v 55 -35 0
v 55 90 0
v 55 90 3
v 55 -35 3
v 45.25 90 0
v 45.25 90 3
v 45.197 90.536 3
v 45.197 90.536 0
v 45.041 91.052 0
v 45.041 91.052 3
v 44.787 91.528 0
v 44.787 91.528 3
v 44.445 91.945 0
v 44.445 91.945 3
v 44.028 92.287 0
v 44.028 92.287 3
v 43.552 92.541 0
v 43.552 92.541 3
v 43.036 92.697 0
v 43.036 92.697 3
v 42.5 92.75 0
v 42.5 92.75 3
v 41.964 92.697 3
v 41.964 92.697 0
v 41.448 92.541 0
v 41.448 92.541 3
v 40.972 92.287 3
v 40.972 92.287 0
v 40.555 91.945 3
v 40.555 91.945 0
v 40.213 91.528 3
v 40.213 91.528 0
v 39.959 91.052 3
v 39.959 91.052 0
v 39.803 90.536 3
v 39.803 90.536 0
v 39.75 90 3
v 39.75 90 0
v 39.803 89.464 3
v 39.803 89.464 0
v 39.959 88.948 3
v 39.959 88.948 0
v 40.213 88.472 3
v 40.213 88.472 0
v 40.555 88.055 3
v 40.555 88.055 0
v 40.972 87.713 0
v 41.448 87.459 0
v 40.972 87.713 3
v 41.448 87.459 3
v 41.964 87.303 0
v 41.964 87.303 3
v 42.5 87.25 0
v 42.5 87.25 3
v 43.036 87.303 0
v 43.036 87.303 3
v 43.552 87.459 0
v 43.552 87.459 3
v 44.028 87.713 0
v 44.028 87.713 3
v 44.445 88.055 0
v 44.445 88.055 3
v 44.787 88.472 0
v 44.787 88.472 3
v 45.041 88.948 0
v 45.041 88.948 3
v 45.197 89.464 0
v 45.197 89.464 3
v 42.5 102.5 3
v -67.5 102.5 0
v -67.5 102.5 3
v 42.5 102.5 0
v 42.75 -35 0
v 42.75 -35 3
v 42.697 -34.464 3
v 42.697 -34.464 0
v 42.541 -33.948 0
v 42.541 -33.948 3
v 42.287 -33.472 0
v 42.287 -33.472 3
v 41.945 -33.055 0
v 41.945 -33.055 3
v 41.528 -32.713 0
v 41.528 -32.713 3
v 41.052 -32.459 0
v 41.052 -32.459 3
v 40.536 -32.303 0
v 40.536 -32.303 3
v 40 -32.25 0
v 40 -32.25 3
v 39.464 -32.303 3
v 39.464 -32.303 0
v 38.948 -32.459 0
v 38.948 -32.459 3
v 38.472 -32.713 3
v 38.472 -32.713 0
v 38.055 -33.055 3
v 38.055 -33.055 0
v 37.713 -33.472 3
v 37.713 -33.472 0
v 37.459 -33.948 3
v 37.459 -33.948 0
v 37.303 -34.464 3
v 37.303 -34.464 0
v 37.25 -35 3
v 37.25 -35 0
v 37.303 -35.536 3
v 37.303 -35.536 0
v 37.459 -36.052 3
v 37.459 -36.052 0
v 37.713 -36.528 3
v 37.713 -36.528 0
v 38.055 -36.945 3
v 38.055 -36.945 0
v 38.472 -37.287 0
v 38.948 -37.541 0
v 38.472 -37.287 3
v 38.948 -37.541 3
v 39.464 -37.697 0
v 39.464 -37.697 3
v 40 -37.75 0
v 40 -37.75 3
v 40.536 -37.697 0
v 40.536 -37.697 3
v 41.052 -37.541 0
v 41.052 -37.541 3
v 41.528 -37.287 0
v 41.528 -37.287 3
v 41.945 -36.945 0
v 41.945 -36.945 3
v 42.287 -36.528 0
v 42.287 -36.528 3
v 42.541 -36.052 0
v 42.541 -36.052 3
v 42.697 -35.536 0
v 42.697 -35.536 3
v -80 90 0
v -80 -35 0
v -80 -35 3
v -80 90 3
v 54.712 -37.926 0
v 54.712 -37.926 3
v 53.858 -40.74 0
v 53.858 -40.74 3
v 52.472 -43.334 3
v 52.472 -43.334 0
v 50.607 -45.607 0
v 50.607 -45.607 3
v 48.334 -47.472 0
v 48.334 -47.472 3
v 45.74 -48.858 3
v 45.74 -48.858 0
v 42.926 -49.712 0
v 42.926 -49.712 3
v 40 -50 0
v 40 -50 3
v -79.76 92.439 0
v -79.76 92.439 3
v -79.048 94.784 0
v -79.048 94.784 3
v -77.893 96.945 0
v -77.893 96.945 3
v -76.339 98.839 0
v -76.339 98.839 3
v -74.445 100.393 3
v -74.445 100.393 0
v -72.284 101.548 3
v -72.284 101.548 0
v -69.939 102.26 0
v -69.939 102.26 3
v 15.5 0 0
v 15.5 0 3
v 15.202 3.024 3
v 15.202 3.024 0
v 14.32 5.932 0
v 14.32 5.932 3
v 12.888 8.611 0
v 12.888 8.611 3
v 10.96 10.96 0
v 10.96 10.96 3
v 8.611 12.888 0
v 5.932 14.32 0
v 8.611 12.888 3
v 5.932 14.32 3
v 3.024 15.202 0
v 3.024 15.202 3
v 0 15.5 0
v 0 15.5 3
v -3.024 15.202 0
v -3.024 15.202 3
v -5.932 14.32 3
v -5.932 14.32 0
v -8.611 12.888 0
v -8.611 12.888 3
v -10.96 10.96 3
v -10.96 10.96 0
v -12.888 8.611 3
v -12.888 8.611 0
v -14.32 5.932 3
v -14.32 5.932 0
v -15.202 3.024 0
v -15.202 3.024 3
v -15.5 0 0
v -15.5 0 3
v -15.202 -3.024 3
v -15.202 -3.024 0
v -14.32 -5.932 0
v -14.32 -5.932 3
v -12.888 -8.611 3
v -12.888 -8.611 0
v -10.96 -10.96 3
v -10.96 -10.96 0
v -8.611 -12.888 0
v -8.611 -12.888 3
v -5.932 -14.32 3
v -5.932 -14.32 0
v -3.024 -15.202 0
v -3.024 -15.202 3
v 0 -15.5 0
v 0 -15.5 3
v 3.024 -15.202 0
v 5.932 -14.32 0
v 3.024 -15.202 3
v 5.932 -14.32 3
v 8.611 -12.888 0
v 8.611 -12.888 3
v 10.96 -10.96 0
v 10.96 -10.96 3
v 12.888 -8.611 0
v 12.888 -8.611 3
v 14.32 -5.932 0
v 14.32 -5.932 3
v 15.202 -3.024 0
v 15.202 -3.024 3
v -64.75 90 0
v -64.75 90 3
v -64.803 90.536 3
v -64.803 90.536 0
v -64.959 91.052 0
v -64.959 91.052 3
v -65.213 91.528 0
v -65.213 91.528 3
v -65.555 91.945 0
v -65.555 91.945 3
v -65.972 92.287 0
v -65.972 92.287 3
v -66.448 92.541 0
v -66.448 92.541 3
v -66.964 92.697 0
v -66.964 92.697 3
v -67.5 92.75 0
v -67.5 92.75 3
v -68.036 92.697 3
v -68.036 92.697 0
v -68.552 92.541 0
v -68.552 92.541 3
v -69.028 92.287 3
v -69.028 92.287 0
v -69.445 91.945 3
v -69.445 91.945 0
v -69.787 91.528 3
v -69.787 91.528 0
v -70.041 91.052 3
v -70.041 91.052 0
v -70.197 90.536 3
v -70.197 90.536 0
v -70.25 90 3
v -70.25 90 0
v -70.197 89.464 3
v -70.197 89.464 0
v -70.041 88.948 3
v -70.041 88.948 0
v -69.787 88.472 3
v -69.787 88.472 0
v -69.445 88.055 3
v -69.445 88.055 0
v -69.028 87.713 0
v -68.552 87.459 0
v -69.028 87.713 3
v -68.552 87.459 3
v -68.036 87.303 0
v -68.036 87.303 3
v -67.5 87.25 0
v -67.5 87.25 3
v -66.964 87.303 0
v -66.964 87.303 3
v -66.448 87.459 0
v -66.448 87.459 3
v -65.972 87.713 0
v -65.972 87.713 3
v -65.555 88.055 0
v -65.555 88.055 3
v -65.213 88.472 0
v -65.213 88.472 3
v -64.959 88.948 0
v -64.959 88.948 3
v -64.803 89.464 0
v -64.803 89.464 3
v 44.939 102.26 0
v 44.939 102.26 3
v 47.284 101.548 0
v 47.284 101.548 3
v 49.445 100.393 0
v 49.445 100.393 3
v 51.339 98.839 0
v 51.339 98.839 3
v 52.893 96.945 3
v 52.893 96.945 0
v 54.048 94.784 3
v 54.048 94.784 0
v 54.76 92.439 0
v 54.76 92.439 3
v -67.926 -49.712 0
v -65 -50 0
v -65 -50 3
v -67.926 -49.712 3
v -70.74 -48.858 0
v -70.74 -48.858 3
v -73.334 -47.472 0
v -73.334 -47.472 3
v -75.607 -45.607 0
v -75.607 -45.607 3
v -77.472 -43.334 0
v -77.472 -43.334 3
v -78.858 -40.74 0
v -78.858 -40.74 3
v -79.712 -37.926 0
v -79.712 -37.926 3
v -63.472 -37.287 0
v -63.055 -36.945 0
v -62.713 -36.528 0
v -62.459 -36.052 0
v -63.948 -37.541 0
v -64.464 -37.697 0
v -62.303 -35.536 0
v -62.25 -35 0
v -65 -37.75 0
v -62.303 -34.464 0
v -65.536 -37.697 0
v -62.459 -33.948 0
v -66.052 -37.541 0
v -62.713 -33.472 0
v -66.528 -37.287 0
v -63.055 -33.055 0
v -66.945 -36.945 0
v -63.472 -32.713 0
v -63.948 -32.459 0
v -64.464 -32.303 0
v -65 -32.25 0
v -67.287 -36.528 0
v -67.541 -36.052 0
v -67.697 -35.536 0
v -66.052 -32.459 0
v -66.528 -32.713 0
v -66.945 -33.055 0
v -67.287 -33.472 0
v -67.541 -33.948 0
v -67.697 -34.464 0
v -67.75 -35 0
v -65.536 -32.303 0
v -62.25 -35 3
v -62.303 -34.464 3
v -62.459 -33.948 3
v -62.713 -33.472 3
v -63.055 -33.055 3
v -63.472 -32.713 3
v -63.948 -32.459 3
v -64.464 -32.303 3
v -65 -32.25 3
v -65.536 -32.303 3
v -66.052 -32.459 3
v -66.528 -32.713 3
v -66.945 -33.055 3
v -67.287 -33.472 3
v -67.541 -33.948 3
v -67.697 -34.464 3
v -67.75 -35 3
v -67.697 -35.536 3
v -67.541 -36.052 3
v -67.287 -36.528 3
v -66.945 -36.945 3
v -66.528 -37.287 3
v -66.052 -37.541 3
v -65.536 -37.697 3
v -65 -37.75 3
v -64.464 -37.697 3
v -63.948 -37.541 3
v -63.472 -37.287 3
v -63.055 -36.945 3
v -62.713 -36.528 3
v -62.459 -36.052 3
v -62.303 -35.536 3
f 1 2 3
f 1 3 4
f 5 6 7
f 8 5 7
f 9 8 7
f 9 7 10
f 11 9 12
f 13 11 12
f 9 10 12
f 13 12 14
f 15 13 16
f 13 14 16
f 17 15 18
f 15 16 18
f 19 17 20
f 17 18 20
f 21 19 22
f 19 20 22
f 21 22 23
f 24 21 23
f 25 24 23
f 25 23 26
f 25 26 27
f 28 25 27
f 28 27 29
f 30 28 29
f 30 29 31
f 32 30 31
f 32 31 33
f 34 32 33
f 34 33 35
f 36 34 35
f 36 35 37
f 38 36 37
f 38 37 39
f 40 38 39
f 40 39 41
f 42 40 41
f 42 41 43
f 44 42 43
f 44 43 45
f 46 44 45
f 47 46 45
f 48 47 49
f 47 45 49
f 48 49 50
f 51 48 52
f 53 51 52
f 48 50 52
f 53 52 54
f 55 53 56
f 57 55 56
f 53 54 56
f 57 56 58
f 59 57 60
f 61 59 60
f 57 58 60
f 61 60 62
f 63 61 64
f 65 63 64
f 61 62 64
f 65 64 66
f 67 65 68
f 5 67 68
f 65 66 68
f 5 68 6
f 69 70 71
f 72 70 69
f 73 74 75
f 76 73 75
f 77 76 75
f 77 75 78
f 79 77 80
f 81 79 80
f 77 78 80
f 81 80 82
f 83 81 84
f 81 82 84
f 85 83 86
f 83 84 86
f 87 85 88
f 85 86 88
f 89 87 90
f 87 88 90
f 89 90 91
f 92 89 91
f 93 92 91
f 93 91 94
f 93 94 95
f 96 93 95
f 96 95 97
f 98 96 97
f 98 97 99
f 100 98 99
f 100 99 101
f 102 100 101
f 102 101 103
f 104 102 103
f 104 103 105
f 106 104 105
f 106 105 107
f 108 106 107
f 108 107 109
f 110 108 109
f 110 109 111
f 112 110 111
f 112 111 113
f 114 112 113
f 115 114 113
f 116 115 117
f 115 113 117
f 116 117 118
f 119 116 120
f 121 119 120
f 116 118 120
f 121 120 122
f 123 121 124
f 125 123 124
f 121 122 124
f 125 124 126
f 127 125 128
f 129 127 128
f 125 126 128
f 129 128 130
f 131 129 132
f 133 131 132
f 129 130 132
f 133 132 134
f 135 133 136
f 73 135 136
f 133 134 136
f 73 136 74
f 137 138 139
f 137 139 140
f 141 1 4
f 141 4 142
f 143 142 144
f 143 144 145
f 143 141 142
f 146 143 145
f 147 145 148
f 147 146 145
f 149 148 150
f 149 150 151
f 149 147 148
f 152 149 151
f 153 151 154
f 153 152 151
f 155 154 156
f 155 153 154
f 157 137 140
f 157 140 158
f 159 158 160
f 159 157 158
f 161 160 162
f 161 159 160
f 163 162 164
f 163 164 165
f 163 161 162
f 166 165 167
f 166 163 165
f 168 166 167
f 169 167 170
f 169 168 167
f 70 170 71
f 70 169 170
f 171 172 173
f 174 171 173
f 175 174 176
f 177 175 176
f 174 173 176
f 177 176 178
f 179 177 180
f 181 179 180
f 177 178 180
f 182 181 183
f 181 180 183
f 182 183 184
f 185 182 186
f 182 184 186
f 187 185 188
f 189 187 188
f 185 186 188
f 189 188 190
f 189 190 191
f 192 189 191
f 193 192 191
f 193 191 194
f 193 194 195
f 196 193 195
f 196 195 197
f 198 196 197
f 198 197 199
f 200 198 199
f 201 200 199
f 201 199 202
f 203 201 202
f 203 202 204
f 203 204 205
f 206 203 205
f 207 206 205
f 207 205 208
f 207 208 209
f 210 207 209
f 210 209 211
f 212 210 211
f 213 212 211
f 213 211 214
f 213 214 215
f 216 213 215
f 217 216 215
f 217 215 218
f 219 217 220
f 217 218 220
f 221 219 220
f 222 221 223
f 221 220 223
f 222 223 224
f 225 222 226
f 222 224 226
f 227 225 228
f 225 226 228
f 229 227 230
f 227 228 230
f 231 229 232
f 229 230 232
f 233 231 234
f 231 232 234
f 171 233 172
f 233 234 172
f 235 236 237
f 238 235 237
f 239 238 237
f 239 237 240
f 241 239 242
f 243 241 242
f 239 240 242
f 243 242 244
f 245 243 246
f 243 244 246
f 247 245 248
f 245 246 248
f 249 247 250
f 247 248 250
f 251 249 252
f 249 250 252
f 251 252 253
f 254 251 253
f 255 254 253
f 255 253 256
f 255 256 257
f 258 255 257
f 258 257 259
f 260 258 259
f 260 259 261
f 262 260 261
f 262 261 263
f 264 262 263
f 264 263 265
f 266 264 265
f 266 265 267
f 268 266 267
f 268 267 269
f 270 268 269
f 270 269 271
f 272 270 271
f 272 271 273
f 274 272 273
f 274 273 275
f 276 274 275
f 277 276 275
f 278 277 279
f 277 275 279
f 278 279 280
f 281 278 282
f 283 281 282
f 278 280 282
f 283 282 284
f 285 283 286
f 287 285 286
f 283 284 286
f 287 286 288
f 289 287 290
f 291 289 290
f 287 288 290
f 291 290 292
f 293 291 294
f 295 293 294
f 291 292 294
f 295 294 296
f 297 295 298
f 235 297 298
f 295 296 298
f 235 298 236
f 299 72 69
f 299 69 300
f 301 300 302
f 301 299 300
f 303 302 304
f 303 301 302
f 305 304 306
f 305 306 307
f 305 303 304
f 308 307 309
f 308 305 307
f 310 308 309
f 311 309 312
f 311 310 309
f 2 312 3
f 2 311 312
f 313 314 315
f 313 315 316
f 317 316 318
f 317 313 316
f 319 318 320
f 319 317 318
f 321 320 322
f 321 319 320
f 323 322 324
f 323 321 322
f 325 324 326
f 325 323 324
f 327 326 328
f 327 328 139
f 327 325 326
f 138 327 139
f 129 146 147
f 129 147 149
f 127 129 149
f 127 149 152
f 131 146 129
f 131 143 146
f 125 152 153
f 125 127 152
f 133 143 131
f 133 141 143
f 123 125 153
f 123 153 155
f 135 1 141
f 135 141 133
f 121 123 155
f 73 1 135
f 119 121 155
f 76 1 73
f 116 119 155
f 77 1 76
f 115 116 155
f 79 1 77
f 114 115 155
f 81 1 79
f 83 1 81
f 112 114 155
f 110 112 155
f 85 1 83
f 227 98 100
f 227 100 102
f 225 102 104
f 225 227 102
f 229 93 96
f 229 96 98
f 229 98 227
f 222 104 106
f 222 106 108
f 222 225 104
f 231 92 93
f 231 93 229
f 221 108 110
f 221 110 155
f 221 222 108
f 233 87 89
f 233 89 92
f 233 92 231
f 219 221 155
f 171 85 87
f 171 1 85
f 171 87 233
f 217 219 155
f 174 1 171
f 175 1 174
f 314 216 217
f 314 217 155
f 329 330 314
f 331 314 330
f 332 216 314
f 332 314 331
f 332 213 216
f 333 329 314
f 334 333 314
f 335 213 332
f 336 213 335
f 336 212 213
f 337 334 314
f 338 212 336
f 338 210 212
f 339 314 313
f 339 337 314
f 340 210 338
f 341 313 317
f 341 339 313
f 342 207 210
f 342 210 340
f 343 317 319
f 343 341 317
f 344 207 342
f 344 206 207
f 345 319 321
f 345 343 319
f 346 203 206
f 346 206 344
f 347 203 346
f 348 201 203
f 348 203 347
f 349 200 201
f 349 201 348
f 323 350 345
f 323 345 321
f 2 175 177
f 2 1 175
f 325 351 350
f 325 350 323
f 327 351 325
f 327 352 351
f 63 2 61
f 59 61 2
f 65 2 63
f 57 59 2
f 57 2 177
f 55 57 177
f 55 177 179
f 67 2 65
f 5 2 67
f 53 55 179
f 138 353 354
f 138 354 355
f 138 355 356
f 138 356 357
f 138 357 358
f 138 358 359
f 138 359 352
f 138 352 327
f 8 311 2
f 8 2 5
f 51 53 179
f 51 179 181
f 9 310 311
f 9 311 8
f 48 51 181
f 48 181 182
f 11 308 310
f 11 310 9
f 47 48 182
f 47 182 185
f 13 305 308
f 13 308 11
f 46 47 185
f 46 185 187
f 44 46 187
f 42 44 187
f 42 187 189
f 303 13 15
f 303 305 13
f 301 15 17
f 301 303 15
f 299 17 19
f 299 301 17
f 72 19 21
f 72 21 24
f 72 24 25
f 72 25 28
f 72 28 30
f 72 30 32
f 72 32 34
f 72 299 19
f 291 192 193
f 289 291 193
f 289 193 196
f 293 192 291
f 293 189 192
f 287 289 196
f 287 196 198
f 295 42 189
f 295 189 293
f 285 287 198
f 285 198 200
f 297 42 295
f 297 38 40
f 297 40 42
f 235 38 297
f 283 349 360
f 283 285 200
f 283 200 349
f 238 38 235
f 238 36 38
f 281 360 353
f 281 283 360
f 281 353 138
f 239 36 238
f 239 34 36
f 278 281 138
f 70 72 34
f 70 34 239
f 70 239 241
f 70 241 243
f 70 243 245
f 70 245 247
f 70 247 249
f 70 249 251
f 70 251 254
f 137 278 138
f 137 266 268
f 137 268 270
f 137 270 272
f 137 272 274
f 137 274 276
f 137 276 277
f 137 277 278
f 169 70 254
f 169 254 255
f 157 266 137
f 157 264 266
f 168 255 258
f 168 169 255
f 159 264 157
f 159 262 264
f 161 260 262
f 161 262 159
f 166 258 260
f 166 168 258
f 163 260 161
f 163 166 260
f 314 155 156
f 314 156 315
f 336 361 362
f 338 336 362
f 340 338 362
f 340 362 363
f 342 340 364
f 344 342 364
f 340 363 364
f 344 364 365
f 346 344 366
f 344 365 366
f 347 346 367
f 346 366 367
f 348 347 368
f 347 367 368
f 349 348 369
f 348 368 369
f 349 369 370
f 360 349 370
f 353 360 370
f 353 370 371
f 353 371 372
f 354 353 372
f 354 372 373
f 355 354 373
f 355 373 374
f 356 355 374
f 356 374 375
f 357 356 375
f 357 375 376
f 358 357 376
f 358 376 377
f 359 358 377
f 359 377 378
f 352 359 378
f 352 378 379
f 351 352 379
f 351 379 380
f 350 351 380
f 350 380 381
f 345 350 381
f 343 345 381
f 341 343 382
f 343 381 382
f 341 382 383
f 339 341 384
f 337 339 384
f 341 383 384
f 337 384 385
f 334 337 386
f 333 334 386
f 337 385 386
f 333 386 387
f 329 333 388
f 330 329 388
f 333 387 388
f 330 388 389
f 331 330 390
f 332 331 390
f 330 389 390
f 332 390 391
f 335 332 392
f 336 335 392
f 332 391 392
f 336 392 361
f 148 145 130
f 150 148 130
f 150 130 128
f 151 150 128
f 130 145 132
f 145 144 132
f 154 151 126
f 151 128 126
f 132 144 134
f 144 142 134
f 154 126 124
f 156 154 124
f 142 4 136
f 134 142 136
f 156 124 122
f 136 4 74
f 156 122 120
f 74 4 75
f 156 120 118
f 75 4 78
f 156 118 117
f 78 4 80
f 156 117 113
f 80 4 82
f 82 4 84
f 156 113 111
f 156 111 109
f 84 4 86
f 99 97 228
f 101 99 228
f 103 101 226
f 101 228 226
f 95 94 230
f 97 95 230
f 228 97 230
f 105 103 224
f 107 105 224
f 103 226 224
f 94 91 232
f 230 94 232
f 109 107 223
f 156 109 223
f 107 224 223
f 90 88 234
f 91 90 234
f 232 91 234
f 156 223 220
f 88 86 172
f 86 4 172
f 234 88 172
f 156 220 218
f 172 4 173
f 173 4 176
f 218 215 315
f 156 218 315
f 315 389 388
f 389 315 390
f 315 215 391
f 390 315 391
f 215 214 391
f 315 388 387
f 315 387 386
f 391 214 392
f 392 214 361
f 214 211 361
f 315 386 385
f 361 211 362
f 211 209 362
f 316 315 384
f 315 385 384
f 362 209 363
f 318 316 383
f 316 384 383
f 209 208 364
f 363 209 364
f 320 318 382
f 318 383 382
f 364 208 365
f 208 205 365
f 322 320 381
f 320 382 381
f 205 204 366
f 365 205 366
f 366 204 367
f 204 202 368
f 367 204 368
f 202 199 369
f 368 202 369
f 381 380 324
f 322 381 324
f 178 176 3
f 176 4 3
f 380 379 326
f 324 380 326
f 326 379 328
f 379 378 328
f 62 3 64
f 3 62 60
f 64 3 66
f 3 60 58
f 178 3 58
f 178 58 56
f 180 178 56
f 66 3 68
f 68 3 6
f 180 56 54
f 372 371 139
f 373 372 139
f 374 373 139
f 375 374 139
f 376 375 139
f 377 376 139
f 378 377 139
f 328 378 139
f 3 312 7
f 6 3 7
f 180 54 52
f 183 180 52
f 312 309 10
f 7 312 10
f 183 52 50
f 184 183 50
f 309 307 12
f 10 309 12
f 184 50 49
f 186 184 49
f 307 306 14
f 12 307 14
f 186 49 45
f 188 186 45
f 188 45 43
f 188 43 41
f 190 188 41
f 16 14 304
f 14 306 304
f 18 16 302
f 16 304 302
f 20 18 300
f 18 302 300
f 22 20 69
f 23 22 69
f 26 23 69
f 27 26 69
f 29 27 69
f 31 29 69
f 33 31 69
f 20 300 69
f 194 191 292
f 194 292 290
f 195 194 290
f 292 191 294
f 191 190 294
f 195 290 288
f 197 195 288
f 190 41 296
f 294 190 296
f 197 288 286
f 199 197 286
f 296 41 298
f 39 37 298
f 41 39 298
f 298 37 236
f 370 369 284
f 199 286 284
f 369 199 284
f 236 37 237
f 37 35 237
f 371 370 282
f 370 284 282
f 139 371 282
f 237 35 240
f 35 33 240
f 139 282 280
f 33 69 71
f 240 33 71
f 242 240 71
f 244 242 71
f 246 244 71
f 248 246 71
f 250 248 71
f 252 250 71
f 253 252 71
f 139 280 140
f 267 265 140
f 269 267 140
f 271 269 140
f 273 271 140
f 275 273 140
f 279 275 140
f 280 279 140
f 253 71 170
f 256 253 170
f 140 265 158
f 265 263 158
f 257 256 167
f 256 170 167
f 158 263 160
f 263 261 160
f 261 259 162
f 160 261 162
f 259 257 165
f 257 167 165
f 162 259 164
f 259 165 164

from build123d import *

# Parameters (mm, degrees)
BASE_FLANGE1_DEPTH   = 3
SKETCH2_R            = 15.5
CUT_EXTRUDE1_DEPTH   = 131.05864062
M5_CLEARANCE_HOLE1_D = 5.5


# Sheet-metal steps are written as plain solids
with BuildPart() as part:
    # Sketch1 → Base-Flange1 (new body)
    with BuildSketch(Plane.XY):
        with BuildLine():
            Line((-67.5, 102.5), (42.5, 102.5))
            ThreePointArc((42.5, 102.5), (51.338834765, 98.838834765), (55, 90))
            Line((55, 90), (55, -35))
            ThreePointArc((55, -35), (50.606601718, -45.606601718), (40, -50))
            Line((40, -50), (-65, -50))
            ThreePointArc((-65, -50), (-75.606601718, -45.606601718), (-80, -35))
            Line((-80, -35), (-80, 90))
            ThreePointArc((-80, 90), (-76.338834765, 98.838834765), (-67.5, 102.5))
        make_face()
    extrude(amount=BASE_FLANGE1_DEPTH)

    # Sketch2 → Cut-Extrude1 (cut, through all)
    with BuildSketch(Plane.XY.offset(3)):
        Circle(SKETCH2_R)
    extrude(amount=-CUT_EXTRUDE1_DEPTH, mode=Mode.SUBTRACT)

    # M5 Clearance Hole1 (through all)
    with Locations(Plane(origin=(0, 0, 0), x_dir=(-1, 0, 0), z_dir=(0, 0, -1))):
        with Locations((-40, -35), (67.5, 90), (65, -35), (-42.5, 90)):
            Hole(M5_CLEARANCE_HOLE1_D / 2)


solid = part.part
